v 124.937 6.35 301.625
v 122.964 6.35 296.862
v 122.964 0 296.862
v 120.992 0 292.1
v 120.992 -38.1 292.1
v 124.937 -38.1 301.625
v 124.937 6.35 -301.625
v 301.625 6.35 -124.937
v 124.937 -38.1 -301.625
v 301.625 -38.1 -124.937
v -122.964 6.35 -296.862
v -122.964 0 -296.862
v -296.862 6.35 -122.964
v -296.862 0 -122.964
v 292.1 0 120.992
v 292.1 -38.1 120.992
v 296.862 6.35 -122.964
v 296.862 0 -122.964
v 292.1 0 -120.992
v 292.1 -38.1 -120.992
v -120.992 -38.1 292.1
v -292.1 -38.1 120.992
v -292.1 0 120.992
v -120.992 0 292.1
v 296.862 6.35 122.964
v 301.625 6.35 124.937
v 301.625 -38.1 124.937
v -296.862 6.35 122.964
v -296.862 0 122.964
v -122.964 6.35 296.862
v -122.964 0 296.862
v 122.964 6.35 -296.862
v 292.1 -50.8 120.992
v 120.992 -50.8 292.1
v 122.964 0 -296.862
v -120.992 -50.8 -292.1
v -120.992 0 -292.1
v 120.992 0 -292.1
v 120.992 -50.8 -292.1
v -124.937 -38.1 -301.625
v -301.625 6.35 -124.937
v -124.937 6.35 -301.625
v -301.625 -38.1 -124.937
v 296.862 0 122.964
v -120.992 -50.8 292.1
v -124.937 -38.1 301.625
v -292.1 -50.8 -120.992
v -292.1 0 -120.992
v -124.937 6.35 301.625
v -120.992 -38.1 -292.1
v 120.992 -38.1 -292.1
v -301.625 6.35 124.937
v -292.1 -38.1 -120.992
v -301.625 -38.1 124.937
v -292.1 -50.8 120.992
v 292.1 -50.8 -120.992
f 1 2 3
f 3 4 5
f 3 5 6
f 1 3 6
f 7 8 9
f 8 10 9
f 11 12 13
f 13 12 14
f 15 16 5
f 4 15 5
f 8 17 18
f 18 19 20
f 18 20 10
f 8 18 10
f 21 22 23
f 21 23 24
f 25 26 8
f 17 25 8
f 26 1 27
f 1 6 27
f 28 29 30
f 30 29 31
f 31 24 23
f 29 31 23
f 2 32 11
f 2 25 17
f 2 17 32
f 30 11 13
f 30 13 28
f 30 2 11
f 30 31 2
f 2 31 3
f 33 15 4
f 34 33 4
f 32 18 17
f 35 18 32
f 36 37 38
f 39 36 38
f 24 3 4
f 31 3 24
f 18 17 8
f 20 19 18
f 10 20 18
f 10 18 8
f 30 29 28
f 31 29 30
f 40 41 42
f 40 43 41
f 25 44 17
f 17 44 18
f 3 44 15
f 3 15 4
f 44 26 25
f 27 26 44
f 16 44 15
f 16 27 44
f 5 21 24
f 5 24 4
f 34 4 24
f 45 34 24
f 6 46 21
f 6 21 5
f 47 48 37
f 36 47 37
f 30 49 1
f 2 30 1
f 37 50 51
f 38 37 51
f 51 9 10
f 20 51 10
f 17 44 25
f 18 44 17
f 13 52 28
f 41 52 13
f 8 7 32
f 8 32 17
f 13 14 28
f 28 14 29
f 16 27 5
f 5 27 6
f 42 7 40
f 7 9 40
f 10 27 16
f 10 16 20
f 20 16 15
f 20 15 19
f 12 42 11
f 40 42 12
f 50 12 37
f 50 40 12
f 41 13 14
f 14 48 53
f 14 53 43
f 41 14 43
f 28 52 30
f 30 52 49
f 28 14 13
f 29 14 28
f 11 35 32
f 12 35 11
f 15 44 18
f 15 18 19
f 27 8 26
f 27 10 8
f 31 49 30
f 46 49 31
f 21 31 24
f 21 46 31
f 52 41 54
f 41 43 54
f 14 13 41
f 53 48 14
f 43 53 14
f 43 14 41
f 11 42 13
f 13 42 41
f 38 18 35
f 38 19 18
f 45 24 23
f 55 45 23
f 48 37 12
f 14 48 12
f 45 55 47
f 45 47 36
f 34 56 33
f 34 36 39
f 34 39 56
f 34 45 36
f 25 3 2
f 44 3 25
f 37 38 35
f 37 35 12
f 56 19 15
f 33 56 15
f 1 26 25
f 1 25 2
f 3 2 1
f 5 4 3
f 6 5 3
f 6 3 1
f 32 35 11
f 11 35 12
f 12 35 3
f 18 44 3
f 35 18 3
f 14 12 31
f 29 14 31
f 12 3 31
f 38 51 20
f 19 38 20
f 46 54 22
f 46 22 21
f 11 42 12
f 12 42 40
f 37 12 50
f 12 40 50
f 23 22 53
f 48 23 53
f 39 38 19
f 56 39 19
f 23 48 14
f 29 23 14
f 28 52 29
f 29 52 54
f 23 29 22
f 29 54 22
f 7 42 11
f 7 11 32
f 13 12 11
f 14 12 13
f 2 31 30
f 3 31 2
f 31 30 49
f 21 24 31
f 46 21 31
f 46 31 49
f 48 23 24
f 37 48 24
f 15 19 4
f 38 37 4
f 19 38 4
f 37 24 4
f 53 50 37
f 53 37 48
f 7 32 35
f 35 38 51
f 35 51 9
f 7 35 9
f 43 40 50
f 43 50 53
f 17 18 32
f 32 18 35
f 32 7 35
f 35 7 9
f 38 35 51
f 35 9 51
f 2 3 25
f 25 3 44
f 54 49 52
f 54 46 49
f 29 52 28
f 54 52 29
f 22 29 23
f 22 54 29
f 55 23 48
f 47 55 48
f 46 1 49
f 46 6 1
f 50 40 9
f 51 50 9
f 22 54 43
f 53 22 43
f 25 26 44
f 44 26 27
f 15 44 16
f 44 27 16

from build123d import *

# Parameters (mm, degrees)
F2_DEPTH      = 50.8
F5_DEPTH      = 38.1
F5_DEPTH_BACK = 6.35
F14_DEPTH     = 6.35


# Not quite as in the source:
# - a variable given as a bare number and used for a length is read in inches; the dataset says mm whatever the document's units were
# - a length typed as a fraction of an inch, garbled in the dataset ("3 / 203.2 mm" for 3/8 in), is restored


with BuildPart() as f2:
    # F1 (on Front) → F2 (new body)
    with BuildSketch(Plane.XZ):
        Polygon((292.0999999997, -120.9917815691), (292.0999999997, 120.9917815691), (120.9917815691, 292.0999999997), (-120.9917815691, 292.0999999997), (-292.0999999997, 120.9917815691), (-292.0999999997, -120.9917815691), (-120.9917815691, -292.0999999997), (120.9917815691, -292.0999999997), align=None)
    extrude(amount=F2_DEPTH)


with BuildPart() as f5:
    # F4 (on Front) → F5 (new body, two sides)
    with BuildSketch(Plane.XZ) as f5_sk:
        Polygon((124.9371657507, 301.6249999997), (-124.9371657507, 301.6249999997), (-120.9917815691, 292.0999999997), (120.9917815691, 292.0999999997), align=None)
    extrude(amount=F5_DEPTH)
    extrude(f5_sk.sketch, amount=-F5_DEPTH_BACK)


with BuildPart() as f6_1:
    # F6: instance of F5
    add(f5.part.mirror(Plane.XY))


with BuildPart() as f7_1:
    # F7: instance of F5
    add(f5.part.mirror(Plane(origin=(122.9644736599, -15.875, 296.8624999997), x_dir=(0, 1, 0), z_dir=(0.9238795325, 0, -0.3826834324))))


with BuildPart() as f8_1:
    # F8: instance of F7_1
    add(f7_1.part.mirror(Plane(origin=(296.8624999997, -15.875, 122.9644736599), x_dir=(1, 0, 0), z_dir=(0.3826834324, 0, -0.9238795325))))


with BuildPart() as f9_1:
    # F9: instance of F8_1
    add(f8_1.part.mirror(Plane(origin=(296.8624999997, -15.875, -122.9644736599), x_dir=(1, 0, 0), z_dir=(-0.3826834324, 0, -0.9238795325))))


with BuildPart() as f10_1:
    # F10: instance of F6_1
    add(f6_1.part.mirror(Plane(origin=(-122.9644736599, -15.875, -296.8624999997), x_dir=(0, -1, 0), z_dir=(-0.9238795325, 0, 0.3826834324))))


with BuildPart() as f11_1:
    # F11: instance of F10_1
    add(f10_1.part.mirror(Plane(origin=(-296.8624999997, -15.875, -122.9644736599), x_dir=(1, 0, 0), z_dir=(-0.3826834324, 0, 0.9238795325))))


with BuildPart() as f12_1:
    # F12: instance of F11_1
    add(f11_1.part.mirror(Plane(origin=(-296.8624999997, -15.875, 122.9644736599), x_dir=(1, 0, 0), z_dir=(0.3826834324, 0, 0.9238795325))))


with BuildPart() as f14:
    # F13 (on face) → F14 (new body)
    with BuildSketch(Plane(origin=(0, 0, 0), x_dir=(-1, 0, 0), z_dir=(0, 1, 0))):
        Polygon((-122.9644736599, -296.8624999997), (122.9644736599, -296.8624999997), (296.8624999997, -122.9644736599), (296.8624999997, 122.9644736599), (122.9644736599, 296.8624999997), (-122.9644736599, 296.8624999997), (-296.8624999997, 122.9644736599), (-296.8624999997, -122.9644736599), align=None)
    extrude(amount=F14_DEPTH)


with BuildPart() as f5_1:
    add(f5.part)

    # F15: cut F14
    add(f14.part, mode=Mode.SUBTRACT)


with BuildPart() as f6_1_1:
    add(f6_1.part)

    # F15: cut F14
    add(f14.part, mode=Mode.SUBTRACT)


with BuildPart() as f7_1_1:
    add(f7_1.part)

    # F15: cut F14
    add(f14.part, mode=Mode.SUBTRACT)


with BuildPart() as f8_1_1:
    add(f8_1.part)

    # F15: cut F14
    add(f14.part, mode=Mode.SUBTRACT)


with BuildPart() as f9_1_1:
    add(f9_1.part)

    # F15: cut F14
    add(f14.part, mode=Mode.SUBTRACT)


with BuildPart() as f10_1_1:
    add(f10_1.part)

    # F15: cut F14
    add(f14.part, mode=Mode.SUBTRACT)


with BuildPart() as f11_1_1:
    add(f11_1.part)

    # F15: cut F14
    add(f14.part, mode=Mode.SUBTRACT)


with BuildPart() as f12_1_1:
    add(f12_1.part)

    # F15: cut F14
    add(f14.part, mode=Mode.SUBTRACT)


solid = Compound([f2.part, f14.part, f5_1.part, f6_1_1.part, f7_1_1.part, f8_1_1.part, f9_1_1.part, f10_1_1.part, f11_1_1.part, f12_1_1.part])
